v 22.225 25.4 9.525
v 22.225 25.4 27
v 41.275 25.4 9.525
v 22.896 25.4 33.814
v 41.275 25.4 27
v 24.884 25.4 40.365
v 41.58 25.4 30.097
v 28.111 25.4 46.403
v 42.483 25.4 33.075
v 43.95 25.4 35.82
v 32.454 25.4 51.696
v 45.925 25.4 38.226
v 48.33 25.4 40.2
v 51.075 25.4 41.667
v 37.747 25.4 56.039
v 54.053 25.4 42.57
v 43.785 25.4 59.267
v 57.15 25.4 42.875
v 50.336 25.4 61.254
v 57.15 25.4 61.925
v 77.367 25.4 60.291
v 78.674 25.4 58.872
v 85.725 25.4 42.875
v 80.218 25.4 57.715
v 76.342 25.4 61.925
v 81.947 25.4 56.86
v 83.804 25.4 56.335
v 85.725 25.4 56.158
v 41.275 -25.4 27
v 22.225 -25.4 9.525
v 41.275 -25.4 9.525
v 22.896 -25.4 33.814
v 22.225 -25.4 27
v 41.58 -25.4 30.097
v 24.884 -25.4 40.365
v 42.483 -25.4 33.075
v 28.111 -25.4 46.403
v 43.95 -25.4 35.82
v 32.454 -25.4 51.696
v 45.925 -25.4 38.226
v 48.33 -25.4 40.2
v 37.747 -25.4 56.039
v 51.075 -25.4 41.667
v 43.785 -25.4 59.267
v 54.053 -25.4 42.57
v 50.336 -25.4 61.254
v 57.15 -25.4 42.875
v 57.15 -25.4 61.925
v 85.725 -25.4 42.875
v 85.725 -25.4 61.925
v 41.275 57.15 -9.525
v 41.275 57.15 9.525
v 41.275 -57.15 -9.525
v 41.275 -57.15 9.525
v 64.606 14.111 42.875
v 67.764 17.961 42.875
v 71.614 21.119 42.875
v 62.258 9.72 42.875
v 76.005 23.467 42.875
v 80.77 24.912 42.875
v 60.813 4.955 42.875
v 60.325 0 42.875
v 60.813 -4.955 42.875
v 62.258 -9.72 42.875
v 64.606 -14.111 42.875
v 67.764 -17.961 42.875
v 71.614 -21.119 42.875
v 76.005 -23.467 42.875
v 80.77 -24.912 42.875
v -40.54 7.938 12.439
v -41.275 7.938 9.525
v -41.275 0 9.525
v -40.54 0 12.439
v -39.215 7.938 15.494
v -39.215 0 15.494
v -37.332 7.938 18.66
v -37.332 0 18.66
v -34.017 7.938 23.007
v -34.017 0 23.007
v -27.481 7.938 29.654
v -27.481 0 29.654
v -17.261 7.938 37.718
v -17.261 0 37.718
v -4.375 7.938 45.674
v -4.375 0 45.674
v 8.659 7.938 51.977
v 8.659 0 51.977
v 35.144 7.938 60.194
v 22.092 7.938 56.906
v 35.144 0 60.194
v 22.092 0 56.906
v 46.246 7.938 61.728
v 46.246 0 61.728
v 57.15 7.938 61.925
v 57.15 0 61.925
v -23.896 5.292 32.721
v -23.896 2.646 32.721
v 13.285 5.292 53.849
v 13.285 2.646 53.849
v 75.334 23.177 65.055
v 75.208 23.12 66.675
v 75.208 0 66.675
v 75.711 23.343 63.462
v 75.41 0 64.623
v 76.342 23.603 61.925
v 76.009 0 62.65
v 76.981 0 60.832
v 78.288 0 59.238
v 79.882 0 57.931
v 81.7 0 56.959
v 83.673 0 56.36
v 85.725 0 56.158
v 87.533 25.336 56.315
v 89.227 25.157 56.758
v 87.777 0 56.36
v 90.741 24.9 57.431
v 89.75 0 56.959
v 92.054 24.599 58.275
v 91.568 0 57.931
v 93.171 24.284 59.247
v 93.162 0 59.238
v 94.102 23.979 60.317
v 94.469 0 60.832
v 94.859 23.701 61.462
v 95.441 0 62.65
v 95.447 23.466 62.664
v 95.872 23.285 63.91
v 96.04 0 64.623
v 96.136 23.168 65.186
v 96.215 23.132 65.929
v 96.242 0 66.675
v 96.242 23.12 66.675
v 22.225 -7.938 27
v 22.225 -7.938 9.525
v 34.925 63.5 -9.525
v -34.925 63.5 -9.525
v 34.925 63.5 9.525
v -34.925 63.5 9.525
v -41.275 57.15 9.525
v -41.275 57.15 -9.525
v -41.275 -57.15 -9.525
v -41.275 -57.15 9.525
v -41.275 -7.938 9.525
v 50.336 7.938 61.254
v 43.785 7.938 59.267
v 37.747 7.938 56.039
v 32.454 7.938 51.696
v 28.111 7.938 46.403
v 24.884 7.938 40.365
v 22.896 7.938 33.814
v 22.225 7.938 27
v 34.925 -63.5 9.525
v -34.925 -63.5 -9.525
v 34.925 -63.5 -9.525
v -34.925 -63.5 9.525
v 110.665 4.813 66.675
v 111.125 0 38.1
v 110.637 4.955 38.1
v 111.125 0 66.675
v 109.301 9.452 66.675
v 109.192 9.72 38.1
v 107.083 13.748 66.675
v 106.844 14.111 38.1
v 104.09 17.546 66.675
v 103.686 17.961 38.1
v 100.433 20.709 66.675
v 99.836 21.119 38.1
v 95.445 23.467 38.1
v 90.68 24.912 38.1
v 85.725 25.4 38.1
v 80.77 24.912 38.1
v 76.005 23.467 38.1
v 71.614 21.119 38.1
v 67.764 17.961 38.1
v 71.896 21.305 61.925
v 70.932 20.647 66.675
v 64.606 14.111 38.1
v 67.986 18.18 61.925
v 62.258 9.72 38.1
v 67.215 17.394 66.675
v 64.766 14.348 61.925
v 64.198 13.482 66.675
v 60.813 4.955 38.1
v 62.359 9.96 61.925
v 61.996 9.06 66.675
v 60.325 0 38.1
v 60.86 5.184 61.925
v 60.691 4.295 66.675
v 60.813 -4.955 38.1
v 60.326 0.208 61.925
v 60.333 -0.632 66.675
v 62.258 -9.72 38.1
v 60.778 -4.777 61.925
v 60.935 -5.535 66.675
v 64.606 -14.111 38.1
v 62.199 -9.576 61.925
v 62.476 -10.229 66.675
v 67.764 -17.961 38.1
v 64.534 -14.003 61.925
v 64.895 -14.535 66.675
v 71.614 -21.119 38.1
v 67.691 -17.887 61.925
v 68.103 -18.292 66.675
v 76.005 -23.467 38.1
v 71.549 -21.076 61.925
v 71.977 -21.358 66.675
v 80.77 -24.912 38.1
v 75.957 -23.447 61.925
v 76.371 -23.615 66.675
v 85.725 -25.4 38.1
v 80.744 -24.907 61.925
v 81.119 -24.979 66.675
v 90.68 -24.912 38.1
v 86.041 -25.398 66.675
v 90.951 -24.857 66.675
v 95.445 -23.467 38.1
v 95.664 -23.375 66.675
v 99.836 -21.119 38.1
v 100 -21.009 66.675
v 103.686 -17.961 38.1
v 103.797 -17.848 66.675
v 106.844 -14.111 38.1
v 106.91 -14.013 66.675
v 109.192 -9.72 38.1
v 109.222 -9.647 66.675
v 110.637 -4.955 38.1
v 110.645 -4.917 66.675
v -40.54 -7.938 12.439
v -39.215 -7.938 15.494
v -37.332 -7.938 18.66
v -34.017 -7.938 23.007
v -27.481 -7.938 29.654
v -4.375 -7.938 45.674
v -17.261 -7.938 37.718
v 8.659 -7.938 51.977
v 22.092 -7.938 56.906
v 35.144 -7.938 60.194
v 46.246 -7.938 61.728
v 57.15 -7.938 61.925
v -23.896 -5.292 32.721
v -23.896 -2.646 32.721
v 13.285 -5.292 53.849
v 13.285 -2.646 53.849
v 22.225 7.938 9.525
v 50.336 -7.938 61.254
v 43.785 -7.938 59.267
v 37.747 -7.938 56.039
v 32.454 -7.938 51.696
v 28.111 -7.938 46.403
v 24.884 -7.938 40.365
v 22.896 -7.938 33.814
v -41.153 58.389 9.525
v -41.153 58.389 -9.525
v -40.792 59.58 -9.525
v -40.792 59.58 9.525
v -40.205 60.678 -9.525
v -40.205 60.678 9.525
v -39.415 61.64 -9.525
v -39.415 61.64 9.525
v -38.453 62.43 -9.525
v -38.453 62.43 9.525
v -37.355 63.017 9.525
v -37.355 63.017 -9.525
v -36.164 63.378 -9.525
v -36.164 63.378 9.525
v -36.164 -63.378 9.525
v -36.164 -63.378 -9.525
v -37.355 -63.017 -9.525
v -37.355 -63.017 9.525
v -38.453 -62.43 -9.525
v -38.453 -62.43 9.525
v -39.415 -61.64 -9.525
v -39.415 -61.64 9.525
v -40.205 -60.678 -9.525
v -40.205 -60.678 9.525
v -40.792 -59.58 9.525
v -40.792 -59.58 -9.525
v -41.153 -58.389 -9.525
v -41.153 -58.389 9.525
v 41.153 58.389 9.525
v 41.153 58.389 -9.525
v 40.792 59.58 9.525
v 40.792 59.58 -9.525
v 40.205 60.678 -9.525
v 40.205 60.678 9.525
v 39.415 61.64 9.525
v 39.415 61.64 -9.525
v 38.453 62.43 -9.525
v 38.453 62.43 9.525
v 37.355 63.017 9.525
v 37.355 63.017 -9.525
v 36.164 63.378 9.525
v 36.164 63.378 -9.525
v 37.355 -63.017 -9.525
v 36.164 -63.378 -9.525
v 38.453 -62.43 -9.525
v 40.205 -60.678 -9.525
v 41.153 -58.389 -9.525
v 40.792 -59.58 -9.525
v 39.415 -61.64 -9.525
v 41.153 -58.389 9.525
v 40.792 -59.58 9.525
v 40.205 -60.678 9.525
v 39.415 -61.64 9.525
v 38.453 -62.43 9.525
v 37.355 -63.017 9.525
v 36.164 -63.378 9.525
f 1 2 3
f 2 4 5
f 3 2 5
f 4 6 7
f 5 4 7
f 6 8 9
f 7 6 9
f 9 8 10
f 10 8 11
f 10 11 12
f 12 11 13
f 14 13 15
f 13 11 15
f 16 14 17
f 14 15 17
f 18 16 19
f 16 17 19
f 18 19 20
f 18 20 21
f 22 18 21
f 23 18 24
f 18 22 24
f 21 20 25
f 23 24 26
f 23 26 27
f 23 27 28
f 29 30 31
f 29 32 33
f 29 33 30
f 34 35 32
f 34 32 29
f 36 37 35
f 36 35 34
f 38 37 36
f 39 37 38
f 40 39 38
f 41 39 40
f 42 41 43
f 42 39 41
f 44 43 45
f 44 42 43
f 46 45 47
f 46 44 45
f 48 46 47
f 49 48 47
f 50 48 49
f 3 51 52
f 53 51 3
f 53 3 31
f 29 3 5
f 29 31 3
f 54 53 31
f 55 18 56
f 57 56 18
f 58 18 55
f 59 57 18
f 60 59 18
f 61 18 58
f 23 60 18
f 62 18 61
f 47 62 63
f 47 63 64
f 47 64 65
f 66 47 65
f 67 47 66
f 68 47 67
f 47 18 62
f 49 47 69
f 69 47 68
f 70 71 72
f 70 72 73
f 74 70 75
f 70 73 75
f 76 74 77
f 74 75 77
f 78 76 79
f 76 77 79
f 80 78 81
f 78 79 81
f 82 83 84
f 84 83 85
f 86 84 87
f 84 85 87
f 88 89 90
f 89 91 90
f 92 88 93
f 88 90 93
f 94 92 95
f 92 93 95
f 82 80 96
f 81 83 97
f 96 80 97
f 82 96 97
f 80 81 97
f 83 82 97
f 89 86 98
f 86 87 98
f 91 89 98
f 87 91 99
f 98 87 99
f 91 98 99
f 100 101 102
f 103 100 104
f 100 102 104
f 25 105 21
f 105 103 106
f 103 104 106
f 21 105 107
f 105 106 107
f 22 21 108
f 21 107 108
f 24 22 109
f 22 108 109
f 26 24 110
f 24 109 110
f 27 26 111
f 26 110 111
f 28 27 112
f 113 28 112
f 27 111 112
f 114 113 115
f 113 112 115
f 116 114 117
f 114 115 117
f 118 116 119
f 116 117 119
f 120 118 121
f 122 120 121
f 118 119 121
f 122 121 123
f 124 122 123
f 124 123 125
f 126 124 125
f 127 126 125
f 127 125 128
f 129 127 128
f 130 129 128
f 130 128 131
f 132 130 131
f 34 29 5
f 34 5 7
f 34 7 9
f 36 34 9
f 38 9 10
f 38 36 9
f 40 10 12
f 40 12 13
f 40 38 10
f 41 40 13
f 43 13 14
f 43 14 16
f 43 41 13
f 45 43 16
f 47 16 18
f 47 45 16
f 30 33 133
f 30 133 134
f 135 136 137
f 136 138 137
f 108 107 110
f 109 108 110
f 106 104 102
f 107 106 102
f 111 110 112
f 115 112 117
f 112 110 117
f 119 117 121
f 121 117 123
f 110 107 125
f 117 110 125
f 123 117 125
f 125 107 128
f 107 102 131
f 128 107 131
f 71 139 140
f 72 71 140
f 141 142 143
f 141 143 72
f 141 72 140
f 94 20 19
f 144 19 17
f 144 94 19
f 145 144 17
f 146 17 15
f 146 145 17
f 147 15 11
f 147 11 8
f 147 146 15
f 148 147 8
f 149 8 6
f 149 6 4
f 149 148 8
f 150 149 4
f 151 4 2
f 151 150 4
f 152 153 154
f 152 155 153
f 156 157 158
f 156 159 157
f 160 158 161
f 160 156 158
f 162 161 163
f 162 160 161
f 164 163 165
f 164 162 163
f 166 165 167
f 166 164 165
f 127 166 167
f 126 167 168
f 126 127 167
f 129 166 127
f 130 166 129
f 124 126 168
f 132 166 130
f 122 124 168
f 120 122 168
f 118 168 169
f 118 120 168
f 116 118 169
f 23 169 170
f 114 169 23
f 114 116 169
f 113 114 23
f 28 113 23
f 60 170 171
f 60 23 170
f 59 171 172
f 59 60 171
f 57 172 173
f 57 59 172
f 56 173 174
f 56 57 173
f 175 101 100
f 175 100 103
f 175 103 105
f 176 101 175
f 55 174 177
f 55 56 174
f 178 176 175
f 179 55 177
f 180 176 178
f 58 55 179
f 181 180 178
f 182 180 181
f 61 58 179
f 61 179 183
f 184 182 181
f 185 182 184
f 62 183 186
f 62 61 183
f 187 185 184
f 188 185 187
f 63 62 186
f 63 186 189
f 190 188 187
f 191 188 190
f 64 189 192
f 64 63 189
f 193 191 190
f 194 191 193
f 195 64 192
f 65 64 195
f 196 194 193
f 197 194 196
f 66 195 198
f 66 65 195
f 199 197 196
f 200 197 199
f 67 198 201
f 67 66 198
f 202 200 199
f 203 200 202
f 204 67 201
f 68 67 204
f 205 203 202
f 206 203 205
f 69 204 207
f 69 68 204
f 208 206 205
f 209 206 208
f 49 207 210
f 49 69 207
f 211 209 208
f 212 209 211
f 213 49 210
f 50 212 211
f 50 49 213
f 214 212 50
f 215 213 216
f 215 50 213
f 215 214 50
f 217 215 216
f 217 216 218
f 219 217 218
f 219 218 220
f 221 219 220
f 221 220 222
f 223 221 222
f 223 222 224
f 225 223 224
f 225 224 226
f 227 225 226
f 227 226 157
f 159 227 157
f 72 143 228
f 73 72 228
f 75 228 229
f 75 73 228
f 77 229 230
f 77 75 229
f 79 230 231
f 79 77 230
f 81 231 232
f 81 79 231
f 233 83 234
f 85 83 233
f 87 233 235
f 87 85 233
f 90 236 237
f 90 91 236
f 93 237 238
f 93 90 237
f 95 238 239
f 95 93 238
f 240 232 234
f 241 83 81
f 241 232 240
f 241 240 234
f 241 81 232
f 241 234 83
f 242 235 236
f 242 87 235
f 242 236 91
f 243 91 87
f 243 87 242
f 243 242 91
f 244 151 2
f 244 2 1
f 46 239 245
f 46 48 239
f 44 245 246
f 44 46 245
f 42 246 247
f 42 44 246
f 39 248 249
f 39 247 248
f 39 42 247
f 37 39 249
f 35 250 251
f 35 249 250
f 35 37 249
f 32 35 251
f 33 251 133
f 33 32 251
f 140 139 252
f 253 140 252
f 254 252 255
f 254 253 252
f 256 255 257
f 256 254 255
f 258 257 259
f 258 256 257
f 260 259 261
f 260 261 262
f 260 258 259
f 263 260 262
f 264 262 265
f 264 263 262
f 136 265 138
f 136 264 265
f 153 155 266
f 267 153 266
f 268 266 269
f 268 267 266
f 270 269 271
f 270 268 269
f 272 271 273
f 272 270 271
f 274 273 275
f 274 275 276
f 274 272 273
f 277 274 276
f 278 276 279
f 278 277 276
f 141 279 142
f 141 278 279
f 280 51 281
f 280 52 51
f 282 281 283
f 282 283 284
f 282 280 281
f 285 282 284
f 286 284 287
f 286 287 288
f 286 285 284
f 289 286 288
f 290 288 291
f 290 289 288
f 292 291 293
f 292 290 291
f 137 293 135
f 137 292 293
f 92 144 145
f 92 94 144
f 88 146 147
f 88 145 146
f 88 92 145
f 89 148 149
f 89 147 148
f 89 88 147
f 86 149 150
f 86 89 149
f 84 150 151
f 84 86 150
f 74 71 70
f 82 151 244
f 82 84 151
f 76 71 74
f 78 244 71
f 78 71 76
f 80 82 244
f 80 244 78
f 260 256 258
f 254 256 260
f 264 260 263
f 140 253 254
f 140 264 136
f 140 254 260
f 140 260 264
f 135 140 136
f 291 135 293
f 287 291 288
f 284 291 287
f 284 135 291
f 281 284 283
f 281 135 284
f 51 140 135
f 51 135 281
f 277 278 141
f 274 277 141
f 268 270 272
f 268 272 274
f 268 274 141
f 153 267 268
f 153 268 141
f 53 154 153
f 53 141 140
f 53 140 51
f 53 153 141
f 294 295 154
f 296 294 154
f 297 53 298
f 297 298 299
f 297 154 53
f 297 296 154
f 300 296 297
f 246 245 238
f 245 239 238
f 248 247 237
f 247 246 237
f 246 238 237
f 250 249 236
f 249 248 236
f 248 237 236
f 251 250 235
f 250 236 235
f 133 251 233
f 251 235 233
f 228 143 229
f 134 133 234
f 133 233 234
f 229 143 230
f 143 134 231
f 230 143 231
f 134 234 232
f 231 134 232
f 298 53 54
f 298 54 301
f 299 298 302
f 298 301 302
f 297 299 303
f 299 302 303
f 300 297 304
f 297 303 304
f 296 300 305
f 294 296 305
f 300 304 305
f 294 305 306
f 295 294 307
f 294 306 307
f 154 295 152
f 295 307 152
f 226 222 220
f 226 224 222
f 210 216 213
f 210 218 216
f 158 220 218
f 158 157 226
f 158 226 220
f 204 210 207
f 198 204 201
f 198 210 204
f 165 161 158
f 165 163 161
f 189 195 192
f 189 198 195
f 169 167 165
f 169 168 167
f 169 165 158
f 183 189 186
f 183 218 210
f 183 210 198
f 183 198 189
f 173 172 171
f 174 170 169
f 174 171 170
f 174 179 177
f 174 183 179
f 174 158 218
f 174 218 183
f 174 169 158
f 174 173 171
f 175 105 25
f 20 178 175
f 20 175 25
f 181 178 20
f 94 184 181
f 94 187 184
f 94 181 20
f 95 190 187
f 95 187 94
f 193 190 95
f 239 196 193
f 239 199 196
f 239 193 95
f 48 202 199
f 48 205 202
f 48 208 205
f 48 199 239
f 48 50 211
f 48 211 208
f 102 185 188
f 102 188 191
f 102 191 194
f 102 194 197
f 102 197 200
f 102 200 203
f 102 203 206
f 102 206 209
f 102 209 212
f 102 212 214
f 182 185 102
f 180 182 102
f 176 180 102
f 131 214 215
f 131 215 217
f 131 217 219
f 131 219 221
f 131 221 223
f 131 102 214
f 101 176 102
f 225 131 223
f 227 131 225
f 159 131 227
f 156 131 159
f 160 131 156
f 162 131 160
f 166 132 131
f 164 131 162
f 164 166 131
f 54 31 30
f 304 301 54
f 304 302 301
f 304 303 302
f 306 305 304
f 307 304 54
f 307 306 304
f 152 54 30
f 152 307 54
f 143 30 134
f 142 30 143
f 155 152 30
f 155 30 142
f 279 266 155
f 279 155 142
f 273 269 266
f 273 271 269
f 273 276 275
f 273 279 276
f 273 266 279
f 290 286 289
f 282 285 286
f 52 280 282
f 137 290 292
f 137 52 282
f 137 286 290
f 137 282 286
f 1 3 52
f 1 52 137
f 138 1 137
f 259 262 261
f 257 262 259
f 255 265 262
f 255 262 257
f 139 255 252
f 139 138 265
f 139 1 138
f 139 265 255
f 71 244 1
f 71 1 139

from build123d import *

# Parameters (mm, degrees)
F1_DEPTH = 63.5
F0_W     = 25.4
F0_H     = 19.05
F2_DEPTH = 25.4
F3_DEPTH = 7.9375
F5_R     = 6.35
F6_D     = 21.03374
F6_DEPTH = 63.501


with BuildPart() as f1:
    # F0 (on Front) → F1 (new body, symmetric)
    with BuildSketch(Plane.XZ):
        Polygon((-41.275, -9.525), (41.275, -9.525), (41.275, 9.525), (22.225, 9.525), (-41.275, 9.525), align=None)
    extrude(amount=F1_DEPTH, both=True)

    # F0 (on Front) → F2 (join, symmetric)
    with BuildSketch(Plane.XZ):
        with BuildLine():
            Line((22.225, 9.525), (41.275, 9.525))
            Line((41.275, 9.525), (41.275, 27.0002))
            ThreePointArc((41.275, 27.0002), (45.9246798487, 38.2255201513), (57.15, 42.8752))
            Line((57.15, 42.8752), (60.325, 42.8752))
            Line((60.325, 42.8752), (60.325, 61.9252))
            Line((60.325, 61.9252), (57.15, 61.9252))
            ThreePointArc((57.15, 61.9252), (32.4542956671, 51.6959043329), (22.225, 27.0002))
            Line((22.225, 27.0002), (22.225, 9.525))
        make_face()
        with Locations((73.025, 52.4002)):
            Rectangle(F0_W, F0_H)
    extrude(amount=F2_DEPTH, both=True)

    # F0 (on Front) → F3 (join, symmetric)
    with BuildSketch(Plane.XZ):
        with BuildLine():
            add(Edge.make_bspline(
                [(-41.275, 9.525), (-38.1687022746, 30.0928875804), (14.3155772239, 64.0365257859), (57.15, 61.9252)],
                knots=[0, 0, 0, 0, 111.5045361635, 111.5045361635, 111.5045361635, 111.5045361635], degree=3))
            Line((-41.275, 9.525), (22.225, 9.525))
            Line((22.225, 9.525), (22.225, 27.0002))
            ThreePointArc((22.225, 27.0002), (32.4542956671, 51.6959043329), (57.15, 61.9252))
        make_face()
    extrude(amount=F3_DEPTH, both=True)

    # F0 (on Front) → F4 (revolve)
    with BuildSketch(Plane.XZ):
        Polygon((85.725, 66.675), (85.725, 61.9252), (85.725, 42.8752), (85.725, 38.1), (111.125, 38.1), (111.125, 66.675), align=None)
    revolve(axis=Axis((85.725, 0, 52.3875), (0, 0, 1)))

    # F5
    f5_edges = [f1.edges().sort_by_distance(p)[0] for p in [
        (-41.275, -63.5, 0),
        (41.275, -63.5, 0),
        (41.275, 63.5, 0),
        (-41.275, 63.5, 0),
    ]]
    fillet(f5_edges, radius=F5_R)

    # F6 (through all, one way)
    with BuildSketch(Plane.XZ):
        with Locations((85.725, 66.675)):
            Circle(F6_D / 2)
    extrude(amount=-F6_DEPTH, mode=Mode.SUBTRACT)


solid = f1.part
